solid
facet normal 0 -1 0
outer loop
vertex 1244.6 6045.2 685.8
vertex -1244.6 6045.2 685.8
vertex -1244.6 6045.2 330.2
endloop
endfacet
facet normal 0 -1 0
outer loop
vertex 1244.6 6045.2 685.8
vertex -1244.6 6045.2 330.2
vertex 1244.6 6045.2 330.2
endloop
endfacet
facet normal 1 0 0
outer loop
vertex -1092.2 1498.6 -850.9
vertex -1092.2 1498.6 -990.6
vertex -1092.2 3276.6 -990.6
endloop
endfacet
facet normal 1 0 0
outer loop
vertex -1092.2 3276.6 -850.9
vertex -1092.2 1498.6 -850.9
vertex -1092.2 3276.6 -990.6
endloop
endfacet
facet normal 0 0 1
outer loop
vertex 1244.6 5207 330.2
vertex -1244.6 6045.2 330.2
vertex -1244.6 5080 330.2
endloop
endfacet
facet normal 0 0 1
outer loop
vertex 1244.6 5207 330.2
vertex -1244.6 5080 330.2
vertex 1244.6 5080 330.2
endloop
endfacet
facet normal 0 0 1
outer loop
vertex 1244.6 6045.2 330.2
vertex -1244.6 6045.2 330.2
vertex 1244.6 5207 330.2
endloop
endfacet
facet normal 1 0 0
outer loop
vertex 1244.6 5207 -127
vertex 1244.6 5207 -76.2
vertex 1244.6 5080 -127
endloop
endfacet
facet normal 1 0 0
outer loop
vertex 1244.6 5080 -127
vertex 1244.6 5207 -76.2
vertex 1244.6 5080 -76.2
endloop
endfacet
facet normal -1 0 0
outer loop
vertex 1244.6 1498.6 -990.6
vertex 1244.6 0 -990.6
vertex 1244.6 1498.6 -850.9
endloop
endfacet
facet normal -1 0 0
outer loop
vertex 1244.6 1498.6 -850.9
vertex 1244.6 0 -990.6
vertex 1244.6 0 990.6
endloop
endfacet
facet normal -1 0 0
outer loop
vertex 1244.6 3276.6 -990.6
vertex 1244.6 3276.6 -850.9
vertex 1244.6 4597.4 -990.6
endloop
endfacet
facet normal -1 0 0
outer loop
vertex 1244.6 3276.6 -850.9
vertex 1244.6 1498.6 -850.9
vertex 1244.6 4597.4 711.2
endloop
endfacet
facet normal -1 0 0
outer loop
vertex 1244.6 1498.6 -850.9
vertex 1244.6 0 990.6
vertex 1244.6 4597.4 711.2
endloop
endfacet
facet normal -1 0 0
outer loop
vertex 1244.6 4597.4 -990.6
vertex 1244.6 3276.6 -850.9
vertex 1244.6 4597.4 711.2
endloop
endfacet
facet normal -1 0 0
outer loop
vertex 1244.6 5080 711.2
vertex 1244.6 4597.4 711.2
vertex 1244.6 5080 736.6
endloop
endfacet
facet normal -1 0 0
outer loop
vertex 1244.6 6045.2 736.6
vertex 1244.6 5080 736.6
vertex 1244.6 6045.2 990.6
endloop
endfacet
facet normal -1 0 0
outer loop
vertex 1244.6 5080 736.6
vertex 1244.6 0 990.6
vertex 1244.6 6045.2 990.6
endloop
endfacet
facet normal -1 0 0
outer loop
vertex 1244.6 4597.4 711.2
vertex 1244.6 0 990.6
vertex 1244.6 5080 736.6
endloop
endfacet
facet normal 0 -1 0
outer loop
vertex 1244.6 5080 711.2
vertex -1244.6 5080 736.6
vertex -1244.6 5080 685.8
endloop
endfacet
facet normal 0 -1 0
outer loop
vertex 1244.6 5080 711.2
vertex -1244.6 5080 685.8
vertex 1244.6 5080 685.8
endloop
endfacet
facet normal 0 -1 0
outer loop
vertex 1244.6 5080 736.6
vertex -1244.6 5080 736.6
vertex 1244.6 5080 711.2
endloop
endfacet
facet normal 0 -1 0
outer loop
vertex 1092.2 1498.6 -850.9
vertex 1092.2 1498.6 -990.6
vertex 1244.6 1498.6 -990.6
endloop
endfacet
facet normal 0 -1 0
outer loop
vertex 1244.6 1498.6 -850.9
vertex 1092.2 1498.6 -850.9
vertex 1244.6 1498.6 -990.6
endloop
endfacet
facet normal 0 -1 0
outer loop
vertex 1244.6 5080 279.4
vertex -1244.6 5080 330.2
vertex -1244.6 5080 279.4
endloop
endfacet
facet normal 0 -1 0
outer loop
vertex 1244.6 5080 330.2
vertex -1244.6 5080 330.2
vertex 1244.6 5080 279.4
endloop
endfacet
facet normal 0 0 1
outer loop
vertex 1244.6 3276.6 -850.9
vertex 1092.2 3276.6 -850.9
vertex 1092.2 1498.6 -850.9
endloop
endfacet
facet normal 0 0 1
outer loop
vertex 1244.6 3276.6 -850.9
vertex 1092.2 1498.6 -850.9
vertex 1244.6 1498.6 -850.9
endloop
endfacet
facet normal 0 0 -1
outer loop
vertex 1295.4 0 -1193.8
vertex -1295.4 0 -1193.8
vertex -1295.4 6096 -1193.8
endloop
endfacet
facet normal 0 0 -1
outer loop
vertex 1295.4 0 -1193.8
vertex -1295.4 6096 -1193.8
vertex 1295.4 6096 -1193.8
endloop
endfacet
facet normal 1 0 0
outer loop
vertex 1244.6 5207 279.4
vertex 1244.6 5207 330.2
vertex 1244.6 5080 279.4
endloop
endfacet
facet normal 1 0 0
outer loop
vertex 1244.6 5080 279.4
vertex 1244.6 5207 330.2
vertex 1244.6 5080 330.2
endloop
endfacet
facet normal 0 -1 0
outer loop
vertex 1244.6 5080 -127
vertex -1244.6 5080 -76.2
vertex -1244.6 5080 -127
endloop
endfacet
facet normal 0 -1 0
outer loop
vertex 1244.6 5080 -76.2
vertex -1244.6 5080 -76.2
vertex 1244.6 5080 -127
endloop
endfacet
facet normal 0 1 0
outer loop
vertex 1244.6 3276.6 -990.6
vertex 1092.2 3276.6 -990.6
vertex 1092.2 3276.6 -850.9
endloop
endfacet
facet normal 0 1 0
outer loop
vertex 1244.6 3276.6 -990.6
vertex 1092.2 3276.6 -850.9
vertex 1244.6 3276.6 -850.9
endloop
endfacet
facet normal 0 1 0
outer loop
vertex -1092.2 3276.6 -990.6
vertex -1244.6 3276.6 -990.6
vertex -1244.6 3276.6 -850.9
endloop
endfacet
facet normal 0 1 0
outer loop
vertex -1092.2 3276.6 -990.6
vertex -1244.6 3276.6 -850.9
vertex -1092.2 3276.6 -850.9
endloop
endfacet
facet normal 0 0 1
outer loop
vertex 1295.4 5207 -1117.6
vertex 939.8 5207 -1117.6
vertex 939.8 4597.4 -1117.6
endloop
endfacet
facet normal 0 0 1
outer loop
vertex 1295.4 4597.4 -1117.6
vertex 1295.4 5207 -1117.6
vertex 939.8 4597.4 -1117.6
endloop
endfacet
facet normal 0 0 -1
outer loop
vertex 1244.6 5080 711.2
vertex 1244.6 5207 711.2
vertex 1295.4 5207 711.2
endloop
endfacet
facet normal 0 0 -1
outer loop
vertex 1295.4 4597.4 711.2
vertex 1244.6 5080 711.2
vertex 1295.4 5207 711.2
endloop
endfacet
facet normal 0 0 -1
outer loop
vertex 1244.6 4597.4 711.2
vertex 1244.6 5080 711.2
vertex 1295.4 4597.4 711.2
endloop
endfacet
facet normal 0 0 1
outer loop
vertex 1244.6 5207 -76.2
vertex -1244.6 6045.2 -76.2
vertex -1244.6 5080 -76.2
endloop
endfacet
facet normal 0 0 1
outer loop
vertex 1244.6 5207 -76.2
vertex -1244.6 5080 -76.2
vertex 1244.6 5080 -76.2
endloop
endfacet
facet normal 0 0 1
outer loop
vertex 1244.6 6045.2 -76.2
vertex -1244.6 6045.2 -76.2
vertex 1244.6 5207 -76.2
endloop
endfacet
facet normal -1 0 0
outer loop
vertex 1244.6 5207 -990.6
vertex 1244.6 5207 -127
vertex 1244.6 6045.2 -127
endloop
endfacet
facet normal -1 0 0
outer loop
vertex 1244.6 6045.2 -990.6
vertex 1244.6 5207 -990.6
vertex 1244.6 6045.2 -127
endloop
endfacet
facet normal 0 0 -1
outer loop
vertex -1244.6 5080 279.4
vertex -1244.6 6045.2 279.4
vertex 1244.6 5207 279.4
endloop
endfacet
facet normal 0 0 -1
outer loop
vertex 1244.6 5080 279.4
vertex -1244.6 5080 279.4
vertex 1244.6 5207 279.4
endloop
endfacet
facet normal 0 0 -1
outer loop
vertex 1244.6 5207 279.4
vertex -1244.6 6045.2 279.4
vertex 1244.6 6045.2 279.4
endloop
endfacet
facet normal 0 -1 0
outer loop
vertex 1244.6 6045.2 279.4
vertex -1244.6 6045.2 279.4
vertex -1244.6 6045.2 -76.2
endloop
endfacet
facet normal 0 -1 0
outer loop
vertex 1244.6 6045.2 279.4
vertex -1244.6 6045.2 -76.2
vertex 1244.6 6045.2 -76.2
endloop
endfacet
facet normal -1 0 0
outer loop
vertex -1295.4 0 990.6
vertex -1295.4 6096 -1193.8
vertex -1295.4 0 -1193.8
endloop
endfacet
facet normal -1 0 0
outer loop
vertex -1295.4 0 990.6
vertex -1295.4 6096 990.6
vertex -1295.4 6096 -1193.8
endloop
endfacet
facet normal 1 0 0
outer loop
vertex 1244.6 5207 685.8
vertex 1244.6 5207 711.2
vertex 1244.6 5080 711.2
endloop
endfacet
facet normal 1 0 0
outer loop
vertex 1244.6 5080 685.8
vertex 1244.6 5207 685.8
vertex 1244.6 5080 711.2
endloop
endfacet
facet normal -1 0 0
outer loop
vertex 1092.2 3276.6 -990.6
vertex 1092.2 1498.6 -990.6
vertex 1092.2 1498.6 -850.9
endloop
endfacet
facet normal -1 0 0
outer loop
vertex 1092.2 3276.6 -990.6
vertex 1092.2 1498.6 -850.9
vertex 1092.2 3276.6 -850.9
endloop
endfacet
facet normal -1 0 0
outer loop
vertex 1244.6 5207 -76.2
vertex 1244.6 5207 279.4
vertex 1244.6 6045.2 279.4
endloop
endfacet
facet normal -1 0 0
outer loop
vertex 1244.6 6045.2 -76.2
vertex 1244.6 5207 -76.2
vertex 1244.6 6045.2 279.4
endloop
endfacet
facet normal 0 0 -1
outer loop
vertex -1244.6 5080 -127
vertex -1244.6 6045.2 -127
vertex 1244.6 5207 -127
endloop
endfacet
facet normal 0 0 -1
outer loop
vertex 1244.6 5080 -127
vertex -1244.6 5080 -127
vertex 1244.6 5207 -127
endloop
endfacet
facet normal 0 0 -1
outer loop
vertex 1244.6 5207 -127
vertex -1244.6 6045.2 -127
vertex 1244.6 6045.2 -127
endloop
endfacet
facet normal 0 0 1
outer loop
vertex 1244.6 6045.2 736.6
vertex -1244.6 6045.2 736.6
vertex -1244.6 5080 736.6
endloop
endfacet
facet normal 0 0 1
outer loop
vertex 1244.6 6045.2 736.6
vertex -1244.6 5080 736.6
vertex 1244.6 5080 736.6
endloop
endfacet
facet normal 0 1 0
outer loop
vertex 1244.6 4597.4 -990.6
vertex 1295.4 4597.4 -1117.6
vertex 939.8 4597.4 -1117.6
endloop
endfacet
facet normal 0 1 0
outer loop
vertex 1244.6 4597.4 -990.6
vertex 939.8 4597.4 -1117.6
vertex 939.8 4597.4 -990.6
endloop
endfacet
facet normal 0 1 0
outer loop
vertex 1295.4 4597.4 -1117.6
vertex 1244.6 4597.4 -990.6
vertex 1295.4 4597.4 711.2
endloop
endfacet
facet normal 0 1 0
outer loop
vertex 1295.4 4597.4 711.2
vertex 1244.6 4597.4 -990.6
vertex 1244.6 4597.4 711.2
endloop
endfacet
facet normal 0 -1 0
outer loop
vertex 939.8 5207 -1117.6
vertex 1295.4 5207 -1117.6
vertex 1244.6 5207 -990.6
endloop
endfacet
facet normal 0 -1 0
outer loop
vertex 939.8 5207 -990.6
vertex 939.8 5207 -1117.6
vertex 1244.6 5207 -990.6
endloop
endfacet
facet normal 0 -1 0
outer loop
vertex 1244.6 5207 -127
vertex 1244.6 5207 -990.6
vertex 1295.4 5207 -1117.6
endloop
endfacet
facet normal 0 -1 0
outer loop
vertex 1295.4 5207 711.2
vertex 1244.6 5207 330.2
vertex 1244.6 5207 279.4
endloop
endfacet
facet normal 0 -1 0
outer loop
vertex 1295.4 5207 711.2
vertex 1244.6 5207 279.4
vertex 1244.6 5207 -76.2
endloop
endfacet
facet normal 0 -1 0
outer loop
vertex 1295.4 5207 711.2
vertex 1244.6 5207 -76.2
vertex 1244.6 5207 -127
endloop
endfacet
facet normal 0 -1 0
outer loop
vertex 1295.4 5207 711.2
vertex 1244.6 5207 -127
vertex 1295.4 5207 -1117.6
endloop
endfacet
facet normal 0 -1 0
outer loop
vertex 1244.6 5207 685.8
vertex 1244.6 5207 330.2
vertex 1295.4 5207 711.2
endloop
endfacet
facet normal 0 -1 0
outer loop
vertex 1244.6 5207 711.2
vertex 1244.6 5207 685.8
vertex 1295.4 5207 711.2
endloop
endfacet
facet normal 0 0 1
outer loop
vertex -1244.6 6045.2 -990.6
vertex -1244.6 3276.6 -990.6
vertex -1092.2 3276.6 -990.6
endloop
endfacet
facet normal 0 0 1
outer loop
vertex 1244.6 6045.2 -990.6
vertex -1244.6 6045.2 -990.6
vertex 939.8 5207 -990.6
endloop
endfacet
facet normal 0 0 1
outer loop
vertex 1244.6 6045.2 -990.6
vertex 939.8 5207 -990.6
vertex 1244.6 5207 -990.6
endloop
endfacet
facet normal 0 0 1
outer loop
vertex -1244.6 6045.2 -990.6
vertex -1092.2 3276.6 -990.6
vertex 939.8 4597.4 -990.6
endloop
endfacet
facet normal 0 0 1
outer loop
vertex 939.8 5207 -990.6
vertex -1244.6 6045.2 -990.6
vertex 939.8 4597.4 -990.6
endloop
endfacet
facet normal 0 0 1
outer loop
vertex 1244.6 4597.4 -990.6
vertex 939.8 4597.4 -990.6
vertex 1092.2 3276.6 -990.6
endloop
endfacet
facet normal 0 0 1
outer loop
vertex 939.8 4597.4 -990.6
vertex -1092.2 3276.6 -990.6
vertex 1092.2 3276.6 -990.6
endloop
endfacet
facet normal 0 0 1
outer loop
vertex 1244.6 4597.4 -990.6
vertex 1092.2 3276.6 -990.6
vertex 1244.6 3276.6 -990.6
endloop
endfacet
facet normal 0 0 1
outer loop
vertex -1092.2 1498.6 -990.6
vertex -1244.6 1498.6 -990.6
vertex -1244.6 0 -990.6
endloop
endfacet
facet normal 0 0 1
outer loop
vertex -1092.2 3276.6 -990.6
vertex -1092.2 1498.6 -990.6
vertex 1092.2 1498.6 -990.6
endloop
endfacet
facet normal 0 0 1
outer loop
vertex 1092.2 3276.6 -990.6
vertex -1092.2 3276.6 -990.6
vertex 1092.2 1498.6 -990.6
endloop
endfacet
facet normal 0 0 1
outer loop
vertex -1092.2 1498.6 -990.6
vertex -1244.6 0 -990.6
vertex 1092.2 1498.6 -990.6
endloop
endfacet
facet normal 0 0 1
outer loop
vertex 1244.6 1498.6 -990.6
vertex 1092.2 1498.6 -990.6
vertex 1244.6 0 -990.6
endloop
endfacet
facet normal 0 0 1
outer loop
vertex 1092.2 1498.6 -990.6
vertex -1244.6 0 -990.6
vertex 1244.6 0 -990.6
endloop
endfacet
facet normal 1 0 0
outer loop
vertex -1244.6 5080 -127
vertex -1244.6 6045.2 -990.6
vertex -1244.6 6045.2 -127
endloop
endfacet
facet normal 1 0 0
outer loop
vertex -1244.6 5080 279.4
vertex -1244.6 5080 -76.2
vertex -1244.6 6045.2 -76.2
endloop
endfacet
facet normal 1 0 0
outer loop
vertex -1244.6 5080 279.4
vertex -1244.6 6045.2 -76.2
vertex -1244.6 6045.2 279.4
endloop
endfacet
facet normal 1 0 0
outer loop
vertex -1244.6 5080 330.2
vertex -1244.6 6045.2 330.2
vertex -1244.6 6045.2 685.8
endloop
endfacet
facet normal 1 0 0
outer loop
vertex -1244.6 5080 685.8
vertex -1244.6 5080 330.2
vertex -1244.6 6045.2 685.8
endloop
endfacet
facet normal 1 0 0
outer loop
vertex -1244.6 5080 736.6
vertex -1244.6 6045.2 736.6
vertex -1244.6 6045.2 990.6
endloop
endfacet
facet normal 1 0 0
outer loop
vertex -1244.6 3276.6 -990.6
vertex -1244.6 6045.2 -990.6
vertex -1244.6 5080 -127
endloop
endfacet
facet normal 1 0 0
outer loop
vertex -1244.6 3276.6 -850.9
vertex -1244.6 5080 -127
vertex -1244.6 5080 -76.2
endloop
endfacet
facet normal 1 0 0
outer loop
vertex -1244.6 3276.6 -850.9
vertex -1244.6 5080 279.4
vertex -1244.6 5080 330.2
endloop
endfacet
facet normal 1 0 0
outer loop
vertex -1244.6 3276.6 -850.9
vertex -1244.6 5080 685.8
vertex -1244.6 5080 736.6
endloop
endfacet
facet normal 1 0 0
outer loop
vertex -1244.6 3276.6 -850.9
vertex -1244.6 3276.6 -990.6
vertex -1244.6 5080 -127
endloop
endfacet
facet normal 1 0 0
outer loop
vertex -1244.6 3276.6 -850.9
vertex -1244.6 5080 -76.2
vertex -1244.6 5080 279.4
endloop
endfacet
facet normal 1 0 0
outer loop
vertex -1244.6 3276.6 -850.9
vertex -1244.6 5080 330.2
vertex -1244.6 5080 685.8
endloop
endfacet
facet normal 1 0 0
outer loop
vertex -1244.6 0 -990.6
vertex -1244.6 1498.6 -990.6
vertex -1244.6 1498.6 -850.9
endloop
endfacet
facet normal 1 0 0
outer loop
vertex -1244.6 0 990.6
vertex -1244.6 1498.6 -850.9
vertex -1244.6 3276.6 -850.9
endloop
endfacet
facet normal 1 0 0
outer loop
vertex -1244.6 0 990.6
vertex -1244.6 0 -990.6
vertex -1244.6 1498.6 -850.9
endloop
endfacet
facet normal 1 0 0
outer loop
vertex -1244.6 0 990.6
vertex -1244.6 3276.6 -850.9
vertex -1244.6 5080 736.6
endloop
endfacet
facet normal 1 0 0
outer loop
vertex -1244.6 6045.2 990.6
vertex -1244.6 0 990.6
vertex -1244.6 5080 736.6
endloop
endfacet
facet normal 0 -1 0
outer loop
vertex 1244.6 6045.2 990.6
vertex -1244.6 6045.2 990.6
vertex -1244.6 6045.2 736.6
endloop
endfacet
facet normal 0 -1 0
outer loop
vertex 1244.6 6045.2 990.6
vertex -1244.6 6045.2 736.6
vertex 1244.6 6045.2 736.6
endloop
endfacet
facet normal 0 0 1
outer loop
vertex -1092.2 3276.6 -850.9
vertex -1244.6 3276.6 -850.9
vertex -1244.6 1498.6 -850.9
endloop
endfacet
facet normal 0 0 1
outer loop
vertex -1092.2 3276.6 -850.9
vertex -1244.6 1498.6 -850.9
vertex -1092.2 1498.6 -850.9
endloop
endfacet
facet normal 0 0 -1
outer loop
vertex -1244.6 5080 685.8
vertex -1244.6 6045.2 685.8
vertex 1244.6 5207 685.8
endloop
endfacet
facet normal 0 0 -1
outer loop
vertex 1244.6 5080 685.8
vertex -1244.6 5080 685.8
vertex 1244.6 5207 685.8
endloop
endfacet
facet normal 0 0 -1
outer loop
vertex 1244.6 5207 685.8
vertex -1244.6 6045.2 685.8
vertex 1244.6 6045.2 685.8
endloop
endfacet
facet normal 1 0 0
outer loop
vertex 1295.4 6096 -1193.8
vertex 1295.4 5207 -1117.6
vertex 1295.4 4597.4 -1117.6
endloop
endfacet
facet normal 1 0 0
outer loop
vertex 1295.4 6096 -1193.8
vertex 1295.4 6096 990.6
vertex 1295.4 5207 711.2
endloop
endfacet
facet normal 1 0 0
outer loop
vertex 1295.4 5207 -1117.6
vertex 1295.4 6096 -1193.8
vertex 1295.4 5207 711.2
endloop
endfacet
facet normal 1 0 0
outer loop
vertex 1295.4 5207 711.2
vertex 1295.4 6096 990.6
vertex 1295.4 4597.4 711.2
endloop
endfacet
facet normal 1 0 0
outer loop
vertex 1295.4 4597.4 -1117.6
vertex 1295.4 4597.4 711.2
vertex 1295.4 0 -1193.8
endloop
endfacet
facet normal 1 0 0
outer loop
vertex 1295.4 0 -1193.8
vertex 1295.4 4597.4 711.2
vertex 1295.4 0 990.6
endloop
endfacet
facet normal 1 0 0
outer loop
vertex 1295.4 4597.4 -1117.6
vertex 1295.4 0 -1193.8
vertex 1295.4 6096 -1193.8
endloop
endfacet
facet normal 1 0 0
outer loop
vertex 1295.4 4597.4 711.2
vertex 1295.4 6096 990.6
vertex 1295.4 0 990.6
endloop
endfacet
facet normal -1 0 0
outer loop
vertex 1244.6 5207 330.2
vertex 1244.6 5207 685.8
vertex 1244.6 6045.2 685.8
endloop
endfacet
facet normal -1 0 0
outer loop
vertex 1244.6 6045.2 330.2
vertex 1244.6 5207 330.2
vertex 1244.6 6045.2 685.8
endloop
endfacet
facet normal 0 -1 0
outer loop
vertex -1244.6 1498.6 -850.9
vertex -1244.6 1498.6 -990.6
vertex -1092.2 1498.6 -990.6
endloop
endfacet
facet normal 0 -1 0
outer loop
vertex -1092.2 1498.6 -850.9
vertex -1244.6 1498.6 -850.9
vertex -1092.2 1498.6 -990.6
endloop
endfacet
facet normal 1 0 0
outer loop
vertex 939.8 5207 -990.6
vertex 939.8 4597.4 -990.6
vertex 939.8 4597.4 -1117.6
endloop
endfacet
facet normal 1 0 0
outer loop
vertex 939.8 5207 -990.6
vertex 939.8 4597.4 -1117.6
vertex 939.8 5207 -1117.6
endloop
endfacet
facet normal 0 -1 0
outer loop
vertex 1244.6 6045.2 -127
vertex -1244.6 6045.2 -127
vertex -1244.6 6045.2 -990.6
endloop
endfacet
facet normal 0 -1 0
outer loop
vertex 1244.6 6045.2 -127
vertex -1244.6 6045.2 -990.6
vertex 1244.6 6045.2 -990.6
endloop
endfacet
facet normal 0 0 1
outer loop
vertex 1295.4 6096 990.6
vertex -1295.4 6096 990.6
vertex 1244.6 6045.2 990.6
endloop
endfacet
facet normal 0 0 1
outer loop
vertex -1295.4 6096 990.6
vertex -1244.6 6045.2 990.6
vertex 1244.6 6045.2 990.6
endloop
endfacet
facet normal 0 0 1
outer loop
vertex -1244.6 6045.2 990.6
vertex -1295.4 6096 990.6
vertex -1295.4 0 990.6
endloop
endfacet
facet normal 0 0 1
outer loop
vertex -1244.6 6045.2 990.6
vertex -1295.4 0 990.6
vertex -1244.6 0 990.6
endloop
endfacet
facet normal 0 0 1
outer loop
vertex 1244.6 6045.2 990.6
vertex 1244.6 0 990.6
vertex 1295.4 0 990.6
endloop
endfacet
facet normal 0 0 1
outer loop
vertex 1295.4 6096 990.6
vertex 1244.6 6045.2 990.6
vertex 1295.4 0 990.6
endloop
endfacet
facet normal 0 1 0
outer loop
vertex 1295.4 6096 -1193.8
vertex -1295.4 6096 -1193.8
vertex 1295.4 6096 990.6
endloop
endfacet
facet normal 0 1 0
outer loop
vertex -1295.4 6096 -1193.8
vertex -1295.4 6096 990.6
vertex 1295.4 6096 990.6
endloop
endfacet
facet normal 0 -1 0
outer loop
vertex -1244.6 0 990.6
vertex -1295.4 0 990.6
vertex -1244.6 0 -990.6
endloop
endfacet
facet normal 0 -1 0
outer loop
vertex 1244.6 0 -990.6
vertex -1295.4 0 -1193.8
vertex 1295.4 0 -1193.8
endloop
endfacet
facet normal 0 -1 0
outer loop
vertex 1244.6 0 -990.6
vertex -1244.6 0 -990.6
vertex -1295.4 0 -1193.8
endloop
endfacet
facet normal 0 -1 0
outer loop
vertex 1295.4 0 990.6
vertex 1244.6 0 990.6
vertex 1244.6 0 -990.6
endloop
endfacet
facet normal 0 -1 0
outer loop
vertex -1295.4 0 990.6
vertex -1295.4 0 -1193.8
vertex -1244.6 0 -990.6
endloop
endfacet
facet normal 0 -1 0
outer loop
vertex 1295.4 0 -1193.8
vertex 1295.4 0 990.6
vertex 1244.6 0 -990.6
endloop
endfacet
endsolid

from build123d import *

# Parameters (mm, degrees)
F0_W      = 2590.8
F0_H      = 1981.2
F1_DEPTH  = 6096
F2_W      = 2489.2
F2_H      = 2489.2
F3_DEPTH  = 6045.2
F4_W      = 2489.2
F4_H      = 6045.2
F5_DEPTH  = 76.2
F6_W      = 2590.8
F6_H      = 6096
F7_DEPTH  = 127
F8_W      = 304.8
F8_H      = 609.6
F9_DEPTH  = 139.7
F10_W     = 2590.8
F10_H     = 6096
F11_DEPTH = 76.2
F12_W     = 152.4
F12_H     = 1778
F13_DEPTH = 139.7
F14_W     = 2489.2
F14_H     = 50.8
F15_DEPTH = 965.2
F16_W     = 609.6
F16_H     = 1828.8
F17_DEPTH = 50.801


with BuildPart() as f1:
    # F0 (on Front) → F1 (new body)
    with BuildSketch(Plane.XZ):
        Rectangle(F0_W, F0_H)
    extrude(amount=-F1_DEPTH)

    # F2 (on face) → F3 (cut)
    with BuildSketch(Plane.XZ):
        Rectangle(F2_W, F2_H)
    extrude(amount=-F3_DEPTH, mode=Mode.SUBTRACT)

    # F4 (on face) → F5 (cut)
    with BuildSketch(Plane.XY.offset(990.6)):
        with Locations((0, 3022.6)):
            Rectangle(F4_W, F4_H)
    extrude(amount=-F5_DEPTH, mode=Mode.SUBTRACT)

    # F6 (on face) → F7 (join)
    with BuildSketch(Plane(origin=(0, 0, -990.6), x_dir=(1, 0, 0), z_dir=(0, 0, -1))):
        with Locations((0, -3048)):
            Rectangle(F6_W, F6_H)
    extrude(amount=F7_DEPTH)

    # F8 (on face) → F9 (cut)
    with BuildSketch(Plane.XY.offset(-990.6)):
        with Locations((1092.2, 4902.2)):
            Rectangle(F8_W, F8_H)
    extrude(amount=-F9_DEPTH, mode=Mode.SUBTRACT)

    # F10 (on face) → F11 (join)
    with BuildSketch(Plane(origin=(0, 0, -1117.6), x_dir=(1, 0, 0), z_dir=(0, 0, -1))):
        with Locations((0, -3048)):
            Rectangle(F10_W, F10_H)
    extrude(amount=F11_DEPTH)

    # F12 (on face) → F13 (join)
    with BuildSketch(Plane.XY.offset(-990.6)):
        with Locations((1168.4, 2387.6)):
            Rectangle(F12_W, F12_H)
        with Locations((-1168.4, 2387.6)):
            Rectangle(F12_W, F12_H)
    extrude(amount=F13_DEPTH)

    # F14 (on face) → F15 (join)
    with BuildSketch(Plane.XZ.offset(-6045.2)):
        with Locations((0, 711.2)):
            Rectangle(F14_W, F14_H)
        with Locations((0, 304.8)):
            Rectangle(F14_W, F14_H)
        with Locations((0, -101.6)):
            Rectangle(F14_W, F14_H)
    extrude(amount=F15_DEPTH)

    # F16 (on face) → F17 (cut, through all)
    with BuildSketch(Plane(origin=(1244.6, 0, 0), x_dir=(0, -1, 0), z_dir=(-1, 0, 0))):
        with Locations((-4902.2, -203.2)):
            Rectangle(F16_W, F16_H)
    extrude(amount=-F17_DEPTH, mode=Mode.SUBTRACT)


solid = f1.part
